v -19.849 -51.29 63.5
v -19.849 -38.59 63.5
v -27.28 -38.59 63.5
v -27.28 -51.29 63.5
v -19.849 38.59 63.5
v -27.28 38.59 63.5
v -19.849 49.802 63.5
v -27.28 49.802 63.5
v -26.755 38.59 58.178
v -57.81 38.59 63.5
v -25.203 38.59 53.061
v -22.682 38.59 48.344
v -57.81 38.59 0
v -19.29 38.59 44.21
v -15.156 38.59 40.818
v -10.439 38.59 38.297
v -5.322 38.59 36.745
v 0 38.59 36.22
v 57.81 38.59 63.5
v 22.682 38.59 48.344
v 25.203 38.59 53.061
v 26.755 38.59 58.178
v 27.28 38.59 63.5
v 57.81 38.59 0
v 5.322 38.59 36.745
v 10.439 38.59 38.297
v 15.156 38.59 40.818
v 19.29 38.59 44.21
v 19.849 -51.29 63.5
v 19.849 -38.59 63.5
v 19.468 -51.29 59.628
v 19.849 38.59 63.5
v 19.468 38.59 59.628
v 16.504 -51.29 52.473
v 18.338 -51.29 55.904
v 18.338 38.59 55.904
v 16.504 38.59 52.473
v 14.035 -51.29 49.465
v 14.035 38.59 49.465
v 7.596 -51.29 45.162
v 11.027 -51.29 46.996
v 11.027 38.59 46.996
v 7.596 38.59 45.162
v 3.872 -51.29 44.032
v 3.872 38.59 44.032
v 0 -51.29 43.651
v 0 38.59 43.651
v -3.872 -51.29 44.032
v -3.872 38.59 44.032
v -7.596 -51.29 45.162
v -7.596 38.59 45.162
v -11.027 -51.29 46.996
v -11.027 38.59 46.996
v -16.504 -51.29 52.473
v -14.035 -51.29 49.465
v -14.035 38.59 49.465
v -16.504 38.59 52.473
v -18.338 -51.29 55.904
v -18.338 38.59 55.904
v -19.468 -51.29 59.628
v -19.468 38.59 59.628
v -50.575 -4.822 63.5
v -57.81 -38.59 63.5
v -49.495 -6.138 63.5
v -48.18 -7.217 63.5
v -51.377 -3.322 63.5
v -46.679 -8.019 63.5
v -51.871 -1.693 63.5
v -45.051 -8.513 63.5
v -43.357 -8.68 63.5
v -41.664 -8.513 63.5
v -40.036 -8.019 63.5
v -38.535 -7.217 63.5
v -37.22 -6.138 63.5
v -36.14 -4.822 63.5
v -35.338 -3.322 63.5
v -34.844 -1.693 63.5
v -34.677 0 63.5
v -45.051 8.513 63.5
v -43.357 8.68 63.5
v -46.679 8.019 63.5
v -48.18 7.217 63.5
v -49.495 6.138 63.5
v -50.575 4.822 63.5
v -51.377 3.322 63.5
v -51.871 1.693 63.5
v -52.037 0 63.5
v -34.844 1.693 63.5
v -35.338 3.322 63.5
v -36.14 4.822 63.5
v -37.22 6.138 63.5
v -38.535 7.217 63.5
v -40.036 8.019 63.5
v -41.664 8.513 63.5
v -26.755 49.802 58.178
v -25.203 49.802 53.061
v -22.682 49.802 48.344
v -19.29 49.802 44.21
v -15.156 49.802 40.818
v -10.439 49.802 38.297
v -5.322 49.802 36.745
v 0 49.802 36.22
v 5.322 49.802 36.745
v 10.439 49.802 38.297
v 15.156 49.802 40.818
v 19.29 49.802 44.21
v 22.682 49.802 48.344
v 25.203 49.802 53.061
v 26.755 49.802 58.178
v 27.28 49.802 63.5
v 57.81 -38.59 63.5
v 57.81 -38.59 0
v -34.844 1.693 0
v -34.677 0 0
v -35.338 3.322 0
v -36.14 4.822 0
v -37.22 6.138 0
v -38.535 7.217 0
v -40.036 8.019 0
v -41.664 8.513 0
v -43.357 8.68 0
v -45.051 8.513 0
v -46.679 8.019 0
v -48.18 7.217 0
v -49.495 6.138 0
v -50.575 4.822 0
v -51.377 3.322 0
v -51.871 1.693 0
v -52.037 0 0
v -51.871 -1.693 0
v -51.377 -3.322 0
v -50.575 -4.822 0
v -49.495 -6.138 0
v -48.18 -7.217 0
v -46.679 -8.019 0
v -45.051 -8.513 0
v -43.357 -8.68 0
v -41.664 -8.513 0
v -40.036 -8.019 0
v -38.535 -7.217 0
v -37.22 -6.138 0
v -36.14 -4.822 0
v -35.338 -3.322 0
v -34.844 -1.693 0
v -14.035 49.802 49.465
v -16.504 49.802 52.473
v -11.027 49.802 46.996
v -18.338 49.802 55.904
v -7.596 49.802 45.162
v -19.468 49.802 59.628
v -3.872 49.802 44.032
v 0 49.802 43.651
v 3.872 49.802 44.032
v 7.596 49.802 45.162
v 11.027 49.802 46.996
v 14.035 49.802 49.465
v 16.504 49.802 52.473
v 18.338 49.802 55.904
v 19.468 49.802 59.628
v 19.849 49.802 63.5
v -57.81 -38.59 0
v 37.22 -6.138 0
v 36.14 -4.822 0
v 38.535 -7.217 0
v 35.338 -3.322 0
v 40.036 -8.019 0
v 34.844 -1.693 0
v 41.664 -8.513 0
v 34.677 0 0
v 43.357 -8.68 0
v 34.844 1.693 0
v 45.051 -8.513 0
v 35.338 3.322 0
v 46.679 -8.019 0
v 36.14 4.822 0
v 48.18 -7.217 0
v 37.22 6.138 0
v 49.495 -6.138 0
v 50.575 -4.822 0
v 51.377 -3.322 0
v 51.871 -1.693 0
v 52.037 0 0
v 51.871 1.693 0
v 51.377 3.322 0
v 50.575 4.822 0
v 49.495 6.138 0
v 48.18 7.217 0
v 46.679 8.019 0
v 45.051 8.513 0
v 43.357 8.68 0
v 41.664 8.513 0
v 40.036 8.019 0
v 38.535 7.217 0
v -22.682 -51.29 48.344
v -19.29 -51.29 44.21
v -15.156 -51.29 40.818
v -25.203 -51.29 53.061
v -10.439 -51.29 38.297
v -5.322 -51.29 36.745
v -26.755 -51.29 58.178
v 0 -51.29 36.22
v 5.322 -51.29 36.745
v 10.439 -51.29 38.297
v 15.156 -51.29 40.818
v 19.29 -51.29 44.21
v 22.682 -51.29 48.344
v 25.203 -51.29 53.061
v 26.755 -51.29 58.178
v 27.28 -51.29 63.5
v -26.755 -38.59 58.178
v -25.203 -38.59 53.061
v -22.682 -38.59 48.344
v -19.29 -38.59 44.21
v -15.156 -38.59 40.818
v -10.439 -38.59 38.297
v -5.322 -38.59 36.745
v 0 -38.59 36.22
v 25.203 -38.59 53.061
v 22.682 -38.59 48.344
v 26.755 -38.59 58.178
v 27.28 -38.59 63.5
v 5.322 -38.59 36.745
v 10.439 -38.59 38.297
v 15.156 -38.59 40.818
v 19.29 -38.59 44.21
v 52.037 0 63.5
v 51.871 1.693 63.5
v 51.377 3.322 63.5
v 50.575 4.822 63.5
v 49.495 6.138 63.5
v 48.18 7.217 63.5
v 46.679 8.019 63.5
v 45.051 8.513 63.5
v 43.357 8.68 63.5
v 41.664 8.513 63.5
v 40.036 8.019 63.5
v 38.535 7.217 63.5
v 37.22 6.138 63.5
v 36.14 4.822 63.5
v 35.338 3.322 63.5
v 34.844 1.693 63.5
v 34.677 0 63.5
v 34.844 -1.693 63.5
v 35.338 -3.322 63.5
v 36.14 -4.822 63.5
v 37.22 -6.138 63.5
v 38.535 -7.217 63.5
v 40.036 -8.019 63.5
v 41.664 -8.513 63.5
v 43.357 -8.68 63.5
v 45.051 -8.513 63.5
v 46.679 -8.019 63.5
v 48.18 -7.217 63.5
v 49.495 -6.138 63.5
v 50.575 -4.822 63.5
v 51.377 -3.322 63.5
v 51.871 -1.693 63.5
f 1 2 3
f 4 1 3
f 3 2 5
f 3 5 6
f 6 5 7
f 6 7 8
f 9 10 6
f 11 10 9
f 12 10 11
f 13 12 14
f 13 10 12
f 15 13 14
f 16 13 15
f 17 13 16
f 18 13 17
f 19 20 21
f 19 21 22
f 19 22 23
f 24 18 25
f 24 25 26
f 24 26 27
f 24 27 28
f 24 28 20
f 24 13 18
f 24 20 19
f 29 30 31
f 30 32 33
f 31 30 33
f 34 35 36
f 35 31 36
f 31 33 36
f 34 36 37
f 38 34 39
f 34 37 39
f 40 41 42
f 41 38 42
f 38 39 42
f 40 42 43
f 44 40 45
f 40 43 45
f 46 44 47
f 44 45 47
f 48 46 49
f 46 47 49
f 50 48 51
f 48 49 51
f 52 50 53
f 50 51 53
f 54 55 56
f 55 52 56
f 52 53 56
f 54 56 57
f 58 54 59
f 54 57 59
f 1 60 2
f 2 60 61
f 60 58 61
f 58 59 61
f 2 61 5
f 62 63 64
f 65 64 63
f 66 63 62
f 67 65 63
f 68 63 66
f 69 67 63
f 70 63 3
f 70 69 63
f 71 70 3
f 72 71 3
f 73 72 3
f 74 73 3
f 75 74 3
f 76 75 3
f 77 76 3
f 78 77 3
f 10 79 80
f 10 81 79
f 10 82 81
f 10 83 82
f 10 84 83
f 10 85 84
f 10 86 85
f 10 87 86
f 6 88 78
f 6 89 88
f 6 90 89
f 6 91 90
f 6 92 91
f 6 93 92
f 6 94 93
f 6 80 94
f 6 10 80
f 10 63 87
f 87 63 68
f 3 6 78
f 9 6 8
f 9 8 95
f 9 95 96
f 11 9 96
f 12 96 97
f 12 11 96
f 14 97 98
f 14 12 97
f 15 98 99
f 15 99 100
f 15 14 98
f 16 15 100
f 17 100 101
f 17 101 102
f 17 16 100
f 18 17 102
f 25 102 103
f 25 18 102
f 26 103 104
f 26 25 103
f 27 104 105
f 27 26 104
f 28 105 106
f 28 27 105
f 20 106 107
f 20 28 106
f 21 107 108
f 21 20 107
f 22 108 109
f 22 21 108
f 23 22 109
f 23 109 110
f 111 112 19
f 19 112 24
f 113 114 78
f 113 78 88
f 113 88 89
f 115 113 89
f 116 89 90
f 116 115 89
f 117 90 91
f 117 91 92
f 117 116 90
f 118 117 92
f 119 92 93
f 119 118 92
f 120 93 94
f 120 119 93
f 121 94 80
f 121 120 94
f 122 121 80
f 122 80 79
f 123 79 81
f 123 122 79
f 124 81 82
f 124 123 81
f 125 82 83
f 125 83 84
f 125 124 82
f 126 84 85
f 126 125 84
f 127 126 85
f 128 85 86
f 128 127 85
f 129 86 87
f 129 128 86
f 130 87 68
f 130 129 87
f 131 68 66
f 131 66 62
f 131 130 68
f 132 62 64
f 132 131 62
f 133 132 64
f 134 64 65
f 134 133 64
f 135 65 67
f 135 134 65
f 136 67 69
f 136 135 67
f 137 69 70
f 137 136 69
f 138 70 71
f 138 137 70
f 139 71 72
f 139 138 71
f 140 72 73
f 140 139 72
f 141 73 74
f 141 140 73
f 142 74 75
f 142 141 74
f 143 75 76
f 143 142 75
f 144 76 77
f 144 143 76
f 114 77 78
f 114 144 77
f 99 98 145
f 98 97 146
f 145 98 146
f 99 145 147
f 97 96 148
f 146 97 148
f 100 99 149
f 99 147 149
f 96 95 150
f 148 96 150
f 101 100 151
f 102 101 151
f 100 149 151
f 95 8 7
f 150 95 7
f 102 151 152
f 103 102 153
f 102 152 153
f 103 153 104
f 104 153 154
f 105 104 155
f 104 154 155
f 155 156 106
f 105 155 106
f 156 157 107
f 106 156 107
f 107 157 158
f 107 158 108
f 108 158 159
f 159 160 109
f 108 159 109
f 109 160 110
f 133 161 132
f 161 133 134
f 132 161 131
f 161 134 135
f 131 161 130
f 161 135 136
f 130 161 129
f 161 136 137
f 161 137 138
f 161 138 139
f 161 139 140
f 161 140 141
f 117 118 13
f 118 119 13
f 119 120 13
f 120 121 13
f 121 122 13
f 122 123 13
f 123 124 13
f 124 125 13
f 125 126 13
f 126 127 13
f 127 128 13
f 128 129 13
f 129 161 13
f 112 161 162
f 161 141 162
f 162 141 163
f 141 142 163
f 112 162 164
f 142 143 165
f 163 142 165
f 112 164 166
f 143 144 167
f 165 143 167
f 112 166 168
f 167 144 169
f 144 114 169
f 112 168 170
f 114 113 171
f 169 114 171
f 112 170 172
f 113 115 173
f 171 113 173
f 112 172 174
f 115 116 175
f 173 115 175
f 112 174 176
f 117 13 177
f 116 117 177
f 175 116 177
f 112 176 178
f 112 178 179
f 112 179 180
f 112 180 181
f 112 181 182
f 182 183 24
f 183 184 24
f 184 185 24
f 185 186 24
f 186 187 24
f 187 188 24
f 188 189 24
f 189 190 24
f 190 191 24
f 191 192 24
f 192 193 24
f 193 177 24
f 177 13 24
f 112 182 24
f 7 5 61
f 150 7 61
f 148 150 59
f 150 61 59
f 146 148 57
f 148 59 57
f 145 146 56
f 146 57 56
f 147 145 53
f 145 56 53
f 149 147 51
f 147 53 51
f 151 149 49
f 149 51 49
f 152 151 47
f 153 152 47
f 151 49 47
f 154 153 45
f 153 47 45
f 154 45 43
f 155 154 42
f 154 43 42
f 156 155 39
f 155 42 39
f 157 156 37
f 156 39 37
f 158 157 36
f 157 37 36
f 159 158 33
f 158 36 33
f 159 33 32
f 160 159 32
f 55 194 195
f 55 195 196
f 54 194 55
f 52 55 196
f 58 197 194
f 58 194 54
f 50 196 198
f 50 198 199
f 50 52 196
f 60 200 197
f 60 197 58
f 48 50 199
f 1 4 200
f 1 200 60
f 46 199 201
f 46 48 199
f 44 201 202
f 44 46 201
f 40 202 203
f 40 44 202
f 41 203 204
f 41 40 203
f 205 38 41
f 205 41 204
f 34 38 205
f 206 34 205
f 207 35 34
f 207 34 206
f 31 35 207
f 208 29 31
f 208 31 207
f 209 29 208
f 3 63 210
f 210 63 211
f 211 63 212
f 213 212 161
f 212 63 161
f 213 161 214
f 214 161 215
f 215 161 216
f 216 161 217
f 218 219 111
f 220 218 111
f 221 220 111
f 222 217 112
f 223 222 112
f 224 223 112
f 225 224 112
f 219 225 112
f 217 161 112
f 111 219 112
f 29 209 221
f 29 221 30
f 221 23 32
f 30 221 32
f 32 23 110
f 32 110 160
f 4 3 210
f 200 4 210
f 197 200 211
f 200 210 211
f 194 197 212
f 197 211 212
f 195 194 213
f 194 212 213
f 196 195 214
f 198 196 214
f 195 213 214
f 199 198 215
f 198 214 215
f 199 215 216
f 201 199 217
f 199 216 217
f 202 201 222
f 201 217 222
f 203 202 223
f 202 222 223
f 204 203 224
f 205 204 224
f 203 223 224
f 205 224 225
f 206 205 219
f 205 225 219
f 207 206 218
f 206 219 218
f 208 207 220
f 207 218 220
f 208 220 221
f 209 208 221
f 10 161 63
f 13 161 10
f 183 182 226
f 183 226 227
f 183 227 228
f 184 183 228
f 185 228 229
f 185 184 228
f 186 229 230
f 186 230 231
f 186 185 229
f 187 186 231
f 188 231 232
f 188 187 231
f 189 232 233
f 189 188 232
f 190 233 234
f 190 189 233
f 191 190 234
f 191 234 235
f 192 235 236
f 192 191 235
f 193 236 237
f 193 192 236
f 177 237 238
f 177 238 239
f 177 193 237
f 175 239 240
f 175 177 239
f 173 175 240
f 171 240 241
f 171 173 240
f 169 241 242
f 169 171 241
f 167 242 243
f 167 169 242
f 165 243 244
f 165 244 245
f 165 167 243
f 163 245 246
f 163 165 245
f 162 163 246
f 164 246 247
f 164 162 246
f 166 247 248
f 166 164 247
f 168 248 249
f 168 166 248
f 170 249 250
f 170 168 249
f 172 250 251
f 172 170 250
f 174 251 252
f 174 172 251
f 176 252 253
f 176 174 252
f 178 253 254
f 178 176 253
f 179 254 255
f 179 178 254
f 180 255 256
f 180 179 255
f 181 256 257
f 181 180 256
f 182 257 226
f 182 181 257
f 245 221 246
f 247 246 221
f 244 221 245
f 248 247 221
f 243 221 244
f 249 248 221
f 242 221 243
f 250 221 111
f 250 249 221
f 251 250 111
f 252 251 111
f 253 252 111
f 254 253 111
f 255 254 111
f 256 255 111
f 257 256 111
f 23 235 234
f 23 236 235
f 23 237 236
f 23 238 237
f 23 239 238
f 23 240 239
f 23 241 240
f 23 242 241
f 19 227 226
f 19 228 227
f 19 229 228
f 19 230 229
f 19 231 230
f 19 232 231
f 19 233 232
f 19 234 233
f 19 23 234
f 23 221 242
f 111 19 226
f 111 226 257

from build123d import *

# Parameters (mm, degrees)
F0_W     = 115.61966
F0_H     = 77.179112
F0_R     = 8.68012
F1_DEPTH = 63.5
F2_R     = 27.279522
F3_DEPTH = 12.7
F4_R     = 27.279522
F4_R_2   = 19.848917
F5_DEPTH = 101.092
F7_DEPTH = 194.818


with BuildPart() as f1:
    # F0 (on Top) → F1 (new body)
    with BuildSketch(Plane.XY):
        Rectangle(F0_W, F0_H)
        with Locations((-43.357372, 0)):
            Circle(F0_R, mode=Mode.SUBTRACT)
        with Locations((43.357372, 0)):
            Circle(F0_R, mode=Mode.SUBTRACT)
    extrude(amount=F1_DEPTH)

    # F2 (on face) → F3 (join)
    with BuildSketch(Plane.XZ.offset(38.589556)):
        with Locations((0, 63.5)):
            Circle(F2_R)
    extrude(amount=F3_DEPTH)

    # F4 (on face) → F5 (join)
    with BuildSketch(Plane.XZ.offset(51.289556)):
        with Locations((0, 63.5)):
            Circle(F4_R)
        with Locations((0, 63.5)):
            Circle(F4_R_2, mode=Mode.SUBTRACT)
    extrude(amount=-F5_DEPTH)

    # F6 (on face) → F7 (cut)
    with BuildSketch(Plane(origin=(0, 49.802444, 0), x_dir=(-1, 0, 0), z_dir=(0, 1, 0))):
        with BuildLine():
            Line((19.848917, 63.5), (27.279522, 63.5))
            Line((27.279522, 63.5), (27.279522, 94.863847))
            Line((27.279522, 94.863847), (-27.279522, 94.863847))
            Line((-27.279522, 94.863847), (-27.279522, 63.5))
            Line((-27.279522, 63.5), (-19.848917, 63.5))
            ThreePointArc((-19.848917, 63.5), (0, 43.651083), (19.848917, 63.5))
        make_face()
    extrude(amount=-F7_DEPTH, mode=Mode.SUBTRACT)


solid = f1.part
